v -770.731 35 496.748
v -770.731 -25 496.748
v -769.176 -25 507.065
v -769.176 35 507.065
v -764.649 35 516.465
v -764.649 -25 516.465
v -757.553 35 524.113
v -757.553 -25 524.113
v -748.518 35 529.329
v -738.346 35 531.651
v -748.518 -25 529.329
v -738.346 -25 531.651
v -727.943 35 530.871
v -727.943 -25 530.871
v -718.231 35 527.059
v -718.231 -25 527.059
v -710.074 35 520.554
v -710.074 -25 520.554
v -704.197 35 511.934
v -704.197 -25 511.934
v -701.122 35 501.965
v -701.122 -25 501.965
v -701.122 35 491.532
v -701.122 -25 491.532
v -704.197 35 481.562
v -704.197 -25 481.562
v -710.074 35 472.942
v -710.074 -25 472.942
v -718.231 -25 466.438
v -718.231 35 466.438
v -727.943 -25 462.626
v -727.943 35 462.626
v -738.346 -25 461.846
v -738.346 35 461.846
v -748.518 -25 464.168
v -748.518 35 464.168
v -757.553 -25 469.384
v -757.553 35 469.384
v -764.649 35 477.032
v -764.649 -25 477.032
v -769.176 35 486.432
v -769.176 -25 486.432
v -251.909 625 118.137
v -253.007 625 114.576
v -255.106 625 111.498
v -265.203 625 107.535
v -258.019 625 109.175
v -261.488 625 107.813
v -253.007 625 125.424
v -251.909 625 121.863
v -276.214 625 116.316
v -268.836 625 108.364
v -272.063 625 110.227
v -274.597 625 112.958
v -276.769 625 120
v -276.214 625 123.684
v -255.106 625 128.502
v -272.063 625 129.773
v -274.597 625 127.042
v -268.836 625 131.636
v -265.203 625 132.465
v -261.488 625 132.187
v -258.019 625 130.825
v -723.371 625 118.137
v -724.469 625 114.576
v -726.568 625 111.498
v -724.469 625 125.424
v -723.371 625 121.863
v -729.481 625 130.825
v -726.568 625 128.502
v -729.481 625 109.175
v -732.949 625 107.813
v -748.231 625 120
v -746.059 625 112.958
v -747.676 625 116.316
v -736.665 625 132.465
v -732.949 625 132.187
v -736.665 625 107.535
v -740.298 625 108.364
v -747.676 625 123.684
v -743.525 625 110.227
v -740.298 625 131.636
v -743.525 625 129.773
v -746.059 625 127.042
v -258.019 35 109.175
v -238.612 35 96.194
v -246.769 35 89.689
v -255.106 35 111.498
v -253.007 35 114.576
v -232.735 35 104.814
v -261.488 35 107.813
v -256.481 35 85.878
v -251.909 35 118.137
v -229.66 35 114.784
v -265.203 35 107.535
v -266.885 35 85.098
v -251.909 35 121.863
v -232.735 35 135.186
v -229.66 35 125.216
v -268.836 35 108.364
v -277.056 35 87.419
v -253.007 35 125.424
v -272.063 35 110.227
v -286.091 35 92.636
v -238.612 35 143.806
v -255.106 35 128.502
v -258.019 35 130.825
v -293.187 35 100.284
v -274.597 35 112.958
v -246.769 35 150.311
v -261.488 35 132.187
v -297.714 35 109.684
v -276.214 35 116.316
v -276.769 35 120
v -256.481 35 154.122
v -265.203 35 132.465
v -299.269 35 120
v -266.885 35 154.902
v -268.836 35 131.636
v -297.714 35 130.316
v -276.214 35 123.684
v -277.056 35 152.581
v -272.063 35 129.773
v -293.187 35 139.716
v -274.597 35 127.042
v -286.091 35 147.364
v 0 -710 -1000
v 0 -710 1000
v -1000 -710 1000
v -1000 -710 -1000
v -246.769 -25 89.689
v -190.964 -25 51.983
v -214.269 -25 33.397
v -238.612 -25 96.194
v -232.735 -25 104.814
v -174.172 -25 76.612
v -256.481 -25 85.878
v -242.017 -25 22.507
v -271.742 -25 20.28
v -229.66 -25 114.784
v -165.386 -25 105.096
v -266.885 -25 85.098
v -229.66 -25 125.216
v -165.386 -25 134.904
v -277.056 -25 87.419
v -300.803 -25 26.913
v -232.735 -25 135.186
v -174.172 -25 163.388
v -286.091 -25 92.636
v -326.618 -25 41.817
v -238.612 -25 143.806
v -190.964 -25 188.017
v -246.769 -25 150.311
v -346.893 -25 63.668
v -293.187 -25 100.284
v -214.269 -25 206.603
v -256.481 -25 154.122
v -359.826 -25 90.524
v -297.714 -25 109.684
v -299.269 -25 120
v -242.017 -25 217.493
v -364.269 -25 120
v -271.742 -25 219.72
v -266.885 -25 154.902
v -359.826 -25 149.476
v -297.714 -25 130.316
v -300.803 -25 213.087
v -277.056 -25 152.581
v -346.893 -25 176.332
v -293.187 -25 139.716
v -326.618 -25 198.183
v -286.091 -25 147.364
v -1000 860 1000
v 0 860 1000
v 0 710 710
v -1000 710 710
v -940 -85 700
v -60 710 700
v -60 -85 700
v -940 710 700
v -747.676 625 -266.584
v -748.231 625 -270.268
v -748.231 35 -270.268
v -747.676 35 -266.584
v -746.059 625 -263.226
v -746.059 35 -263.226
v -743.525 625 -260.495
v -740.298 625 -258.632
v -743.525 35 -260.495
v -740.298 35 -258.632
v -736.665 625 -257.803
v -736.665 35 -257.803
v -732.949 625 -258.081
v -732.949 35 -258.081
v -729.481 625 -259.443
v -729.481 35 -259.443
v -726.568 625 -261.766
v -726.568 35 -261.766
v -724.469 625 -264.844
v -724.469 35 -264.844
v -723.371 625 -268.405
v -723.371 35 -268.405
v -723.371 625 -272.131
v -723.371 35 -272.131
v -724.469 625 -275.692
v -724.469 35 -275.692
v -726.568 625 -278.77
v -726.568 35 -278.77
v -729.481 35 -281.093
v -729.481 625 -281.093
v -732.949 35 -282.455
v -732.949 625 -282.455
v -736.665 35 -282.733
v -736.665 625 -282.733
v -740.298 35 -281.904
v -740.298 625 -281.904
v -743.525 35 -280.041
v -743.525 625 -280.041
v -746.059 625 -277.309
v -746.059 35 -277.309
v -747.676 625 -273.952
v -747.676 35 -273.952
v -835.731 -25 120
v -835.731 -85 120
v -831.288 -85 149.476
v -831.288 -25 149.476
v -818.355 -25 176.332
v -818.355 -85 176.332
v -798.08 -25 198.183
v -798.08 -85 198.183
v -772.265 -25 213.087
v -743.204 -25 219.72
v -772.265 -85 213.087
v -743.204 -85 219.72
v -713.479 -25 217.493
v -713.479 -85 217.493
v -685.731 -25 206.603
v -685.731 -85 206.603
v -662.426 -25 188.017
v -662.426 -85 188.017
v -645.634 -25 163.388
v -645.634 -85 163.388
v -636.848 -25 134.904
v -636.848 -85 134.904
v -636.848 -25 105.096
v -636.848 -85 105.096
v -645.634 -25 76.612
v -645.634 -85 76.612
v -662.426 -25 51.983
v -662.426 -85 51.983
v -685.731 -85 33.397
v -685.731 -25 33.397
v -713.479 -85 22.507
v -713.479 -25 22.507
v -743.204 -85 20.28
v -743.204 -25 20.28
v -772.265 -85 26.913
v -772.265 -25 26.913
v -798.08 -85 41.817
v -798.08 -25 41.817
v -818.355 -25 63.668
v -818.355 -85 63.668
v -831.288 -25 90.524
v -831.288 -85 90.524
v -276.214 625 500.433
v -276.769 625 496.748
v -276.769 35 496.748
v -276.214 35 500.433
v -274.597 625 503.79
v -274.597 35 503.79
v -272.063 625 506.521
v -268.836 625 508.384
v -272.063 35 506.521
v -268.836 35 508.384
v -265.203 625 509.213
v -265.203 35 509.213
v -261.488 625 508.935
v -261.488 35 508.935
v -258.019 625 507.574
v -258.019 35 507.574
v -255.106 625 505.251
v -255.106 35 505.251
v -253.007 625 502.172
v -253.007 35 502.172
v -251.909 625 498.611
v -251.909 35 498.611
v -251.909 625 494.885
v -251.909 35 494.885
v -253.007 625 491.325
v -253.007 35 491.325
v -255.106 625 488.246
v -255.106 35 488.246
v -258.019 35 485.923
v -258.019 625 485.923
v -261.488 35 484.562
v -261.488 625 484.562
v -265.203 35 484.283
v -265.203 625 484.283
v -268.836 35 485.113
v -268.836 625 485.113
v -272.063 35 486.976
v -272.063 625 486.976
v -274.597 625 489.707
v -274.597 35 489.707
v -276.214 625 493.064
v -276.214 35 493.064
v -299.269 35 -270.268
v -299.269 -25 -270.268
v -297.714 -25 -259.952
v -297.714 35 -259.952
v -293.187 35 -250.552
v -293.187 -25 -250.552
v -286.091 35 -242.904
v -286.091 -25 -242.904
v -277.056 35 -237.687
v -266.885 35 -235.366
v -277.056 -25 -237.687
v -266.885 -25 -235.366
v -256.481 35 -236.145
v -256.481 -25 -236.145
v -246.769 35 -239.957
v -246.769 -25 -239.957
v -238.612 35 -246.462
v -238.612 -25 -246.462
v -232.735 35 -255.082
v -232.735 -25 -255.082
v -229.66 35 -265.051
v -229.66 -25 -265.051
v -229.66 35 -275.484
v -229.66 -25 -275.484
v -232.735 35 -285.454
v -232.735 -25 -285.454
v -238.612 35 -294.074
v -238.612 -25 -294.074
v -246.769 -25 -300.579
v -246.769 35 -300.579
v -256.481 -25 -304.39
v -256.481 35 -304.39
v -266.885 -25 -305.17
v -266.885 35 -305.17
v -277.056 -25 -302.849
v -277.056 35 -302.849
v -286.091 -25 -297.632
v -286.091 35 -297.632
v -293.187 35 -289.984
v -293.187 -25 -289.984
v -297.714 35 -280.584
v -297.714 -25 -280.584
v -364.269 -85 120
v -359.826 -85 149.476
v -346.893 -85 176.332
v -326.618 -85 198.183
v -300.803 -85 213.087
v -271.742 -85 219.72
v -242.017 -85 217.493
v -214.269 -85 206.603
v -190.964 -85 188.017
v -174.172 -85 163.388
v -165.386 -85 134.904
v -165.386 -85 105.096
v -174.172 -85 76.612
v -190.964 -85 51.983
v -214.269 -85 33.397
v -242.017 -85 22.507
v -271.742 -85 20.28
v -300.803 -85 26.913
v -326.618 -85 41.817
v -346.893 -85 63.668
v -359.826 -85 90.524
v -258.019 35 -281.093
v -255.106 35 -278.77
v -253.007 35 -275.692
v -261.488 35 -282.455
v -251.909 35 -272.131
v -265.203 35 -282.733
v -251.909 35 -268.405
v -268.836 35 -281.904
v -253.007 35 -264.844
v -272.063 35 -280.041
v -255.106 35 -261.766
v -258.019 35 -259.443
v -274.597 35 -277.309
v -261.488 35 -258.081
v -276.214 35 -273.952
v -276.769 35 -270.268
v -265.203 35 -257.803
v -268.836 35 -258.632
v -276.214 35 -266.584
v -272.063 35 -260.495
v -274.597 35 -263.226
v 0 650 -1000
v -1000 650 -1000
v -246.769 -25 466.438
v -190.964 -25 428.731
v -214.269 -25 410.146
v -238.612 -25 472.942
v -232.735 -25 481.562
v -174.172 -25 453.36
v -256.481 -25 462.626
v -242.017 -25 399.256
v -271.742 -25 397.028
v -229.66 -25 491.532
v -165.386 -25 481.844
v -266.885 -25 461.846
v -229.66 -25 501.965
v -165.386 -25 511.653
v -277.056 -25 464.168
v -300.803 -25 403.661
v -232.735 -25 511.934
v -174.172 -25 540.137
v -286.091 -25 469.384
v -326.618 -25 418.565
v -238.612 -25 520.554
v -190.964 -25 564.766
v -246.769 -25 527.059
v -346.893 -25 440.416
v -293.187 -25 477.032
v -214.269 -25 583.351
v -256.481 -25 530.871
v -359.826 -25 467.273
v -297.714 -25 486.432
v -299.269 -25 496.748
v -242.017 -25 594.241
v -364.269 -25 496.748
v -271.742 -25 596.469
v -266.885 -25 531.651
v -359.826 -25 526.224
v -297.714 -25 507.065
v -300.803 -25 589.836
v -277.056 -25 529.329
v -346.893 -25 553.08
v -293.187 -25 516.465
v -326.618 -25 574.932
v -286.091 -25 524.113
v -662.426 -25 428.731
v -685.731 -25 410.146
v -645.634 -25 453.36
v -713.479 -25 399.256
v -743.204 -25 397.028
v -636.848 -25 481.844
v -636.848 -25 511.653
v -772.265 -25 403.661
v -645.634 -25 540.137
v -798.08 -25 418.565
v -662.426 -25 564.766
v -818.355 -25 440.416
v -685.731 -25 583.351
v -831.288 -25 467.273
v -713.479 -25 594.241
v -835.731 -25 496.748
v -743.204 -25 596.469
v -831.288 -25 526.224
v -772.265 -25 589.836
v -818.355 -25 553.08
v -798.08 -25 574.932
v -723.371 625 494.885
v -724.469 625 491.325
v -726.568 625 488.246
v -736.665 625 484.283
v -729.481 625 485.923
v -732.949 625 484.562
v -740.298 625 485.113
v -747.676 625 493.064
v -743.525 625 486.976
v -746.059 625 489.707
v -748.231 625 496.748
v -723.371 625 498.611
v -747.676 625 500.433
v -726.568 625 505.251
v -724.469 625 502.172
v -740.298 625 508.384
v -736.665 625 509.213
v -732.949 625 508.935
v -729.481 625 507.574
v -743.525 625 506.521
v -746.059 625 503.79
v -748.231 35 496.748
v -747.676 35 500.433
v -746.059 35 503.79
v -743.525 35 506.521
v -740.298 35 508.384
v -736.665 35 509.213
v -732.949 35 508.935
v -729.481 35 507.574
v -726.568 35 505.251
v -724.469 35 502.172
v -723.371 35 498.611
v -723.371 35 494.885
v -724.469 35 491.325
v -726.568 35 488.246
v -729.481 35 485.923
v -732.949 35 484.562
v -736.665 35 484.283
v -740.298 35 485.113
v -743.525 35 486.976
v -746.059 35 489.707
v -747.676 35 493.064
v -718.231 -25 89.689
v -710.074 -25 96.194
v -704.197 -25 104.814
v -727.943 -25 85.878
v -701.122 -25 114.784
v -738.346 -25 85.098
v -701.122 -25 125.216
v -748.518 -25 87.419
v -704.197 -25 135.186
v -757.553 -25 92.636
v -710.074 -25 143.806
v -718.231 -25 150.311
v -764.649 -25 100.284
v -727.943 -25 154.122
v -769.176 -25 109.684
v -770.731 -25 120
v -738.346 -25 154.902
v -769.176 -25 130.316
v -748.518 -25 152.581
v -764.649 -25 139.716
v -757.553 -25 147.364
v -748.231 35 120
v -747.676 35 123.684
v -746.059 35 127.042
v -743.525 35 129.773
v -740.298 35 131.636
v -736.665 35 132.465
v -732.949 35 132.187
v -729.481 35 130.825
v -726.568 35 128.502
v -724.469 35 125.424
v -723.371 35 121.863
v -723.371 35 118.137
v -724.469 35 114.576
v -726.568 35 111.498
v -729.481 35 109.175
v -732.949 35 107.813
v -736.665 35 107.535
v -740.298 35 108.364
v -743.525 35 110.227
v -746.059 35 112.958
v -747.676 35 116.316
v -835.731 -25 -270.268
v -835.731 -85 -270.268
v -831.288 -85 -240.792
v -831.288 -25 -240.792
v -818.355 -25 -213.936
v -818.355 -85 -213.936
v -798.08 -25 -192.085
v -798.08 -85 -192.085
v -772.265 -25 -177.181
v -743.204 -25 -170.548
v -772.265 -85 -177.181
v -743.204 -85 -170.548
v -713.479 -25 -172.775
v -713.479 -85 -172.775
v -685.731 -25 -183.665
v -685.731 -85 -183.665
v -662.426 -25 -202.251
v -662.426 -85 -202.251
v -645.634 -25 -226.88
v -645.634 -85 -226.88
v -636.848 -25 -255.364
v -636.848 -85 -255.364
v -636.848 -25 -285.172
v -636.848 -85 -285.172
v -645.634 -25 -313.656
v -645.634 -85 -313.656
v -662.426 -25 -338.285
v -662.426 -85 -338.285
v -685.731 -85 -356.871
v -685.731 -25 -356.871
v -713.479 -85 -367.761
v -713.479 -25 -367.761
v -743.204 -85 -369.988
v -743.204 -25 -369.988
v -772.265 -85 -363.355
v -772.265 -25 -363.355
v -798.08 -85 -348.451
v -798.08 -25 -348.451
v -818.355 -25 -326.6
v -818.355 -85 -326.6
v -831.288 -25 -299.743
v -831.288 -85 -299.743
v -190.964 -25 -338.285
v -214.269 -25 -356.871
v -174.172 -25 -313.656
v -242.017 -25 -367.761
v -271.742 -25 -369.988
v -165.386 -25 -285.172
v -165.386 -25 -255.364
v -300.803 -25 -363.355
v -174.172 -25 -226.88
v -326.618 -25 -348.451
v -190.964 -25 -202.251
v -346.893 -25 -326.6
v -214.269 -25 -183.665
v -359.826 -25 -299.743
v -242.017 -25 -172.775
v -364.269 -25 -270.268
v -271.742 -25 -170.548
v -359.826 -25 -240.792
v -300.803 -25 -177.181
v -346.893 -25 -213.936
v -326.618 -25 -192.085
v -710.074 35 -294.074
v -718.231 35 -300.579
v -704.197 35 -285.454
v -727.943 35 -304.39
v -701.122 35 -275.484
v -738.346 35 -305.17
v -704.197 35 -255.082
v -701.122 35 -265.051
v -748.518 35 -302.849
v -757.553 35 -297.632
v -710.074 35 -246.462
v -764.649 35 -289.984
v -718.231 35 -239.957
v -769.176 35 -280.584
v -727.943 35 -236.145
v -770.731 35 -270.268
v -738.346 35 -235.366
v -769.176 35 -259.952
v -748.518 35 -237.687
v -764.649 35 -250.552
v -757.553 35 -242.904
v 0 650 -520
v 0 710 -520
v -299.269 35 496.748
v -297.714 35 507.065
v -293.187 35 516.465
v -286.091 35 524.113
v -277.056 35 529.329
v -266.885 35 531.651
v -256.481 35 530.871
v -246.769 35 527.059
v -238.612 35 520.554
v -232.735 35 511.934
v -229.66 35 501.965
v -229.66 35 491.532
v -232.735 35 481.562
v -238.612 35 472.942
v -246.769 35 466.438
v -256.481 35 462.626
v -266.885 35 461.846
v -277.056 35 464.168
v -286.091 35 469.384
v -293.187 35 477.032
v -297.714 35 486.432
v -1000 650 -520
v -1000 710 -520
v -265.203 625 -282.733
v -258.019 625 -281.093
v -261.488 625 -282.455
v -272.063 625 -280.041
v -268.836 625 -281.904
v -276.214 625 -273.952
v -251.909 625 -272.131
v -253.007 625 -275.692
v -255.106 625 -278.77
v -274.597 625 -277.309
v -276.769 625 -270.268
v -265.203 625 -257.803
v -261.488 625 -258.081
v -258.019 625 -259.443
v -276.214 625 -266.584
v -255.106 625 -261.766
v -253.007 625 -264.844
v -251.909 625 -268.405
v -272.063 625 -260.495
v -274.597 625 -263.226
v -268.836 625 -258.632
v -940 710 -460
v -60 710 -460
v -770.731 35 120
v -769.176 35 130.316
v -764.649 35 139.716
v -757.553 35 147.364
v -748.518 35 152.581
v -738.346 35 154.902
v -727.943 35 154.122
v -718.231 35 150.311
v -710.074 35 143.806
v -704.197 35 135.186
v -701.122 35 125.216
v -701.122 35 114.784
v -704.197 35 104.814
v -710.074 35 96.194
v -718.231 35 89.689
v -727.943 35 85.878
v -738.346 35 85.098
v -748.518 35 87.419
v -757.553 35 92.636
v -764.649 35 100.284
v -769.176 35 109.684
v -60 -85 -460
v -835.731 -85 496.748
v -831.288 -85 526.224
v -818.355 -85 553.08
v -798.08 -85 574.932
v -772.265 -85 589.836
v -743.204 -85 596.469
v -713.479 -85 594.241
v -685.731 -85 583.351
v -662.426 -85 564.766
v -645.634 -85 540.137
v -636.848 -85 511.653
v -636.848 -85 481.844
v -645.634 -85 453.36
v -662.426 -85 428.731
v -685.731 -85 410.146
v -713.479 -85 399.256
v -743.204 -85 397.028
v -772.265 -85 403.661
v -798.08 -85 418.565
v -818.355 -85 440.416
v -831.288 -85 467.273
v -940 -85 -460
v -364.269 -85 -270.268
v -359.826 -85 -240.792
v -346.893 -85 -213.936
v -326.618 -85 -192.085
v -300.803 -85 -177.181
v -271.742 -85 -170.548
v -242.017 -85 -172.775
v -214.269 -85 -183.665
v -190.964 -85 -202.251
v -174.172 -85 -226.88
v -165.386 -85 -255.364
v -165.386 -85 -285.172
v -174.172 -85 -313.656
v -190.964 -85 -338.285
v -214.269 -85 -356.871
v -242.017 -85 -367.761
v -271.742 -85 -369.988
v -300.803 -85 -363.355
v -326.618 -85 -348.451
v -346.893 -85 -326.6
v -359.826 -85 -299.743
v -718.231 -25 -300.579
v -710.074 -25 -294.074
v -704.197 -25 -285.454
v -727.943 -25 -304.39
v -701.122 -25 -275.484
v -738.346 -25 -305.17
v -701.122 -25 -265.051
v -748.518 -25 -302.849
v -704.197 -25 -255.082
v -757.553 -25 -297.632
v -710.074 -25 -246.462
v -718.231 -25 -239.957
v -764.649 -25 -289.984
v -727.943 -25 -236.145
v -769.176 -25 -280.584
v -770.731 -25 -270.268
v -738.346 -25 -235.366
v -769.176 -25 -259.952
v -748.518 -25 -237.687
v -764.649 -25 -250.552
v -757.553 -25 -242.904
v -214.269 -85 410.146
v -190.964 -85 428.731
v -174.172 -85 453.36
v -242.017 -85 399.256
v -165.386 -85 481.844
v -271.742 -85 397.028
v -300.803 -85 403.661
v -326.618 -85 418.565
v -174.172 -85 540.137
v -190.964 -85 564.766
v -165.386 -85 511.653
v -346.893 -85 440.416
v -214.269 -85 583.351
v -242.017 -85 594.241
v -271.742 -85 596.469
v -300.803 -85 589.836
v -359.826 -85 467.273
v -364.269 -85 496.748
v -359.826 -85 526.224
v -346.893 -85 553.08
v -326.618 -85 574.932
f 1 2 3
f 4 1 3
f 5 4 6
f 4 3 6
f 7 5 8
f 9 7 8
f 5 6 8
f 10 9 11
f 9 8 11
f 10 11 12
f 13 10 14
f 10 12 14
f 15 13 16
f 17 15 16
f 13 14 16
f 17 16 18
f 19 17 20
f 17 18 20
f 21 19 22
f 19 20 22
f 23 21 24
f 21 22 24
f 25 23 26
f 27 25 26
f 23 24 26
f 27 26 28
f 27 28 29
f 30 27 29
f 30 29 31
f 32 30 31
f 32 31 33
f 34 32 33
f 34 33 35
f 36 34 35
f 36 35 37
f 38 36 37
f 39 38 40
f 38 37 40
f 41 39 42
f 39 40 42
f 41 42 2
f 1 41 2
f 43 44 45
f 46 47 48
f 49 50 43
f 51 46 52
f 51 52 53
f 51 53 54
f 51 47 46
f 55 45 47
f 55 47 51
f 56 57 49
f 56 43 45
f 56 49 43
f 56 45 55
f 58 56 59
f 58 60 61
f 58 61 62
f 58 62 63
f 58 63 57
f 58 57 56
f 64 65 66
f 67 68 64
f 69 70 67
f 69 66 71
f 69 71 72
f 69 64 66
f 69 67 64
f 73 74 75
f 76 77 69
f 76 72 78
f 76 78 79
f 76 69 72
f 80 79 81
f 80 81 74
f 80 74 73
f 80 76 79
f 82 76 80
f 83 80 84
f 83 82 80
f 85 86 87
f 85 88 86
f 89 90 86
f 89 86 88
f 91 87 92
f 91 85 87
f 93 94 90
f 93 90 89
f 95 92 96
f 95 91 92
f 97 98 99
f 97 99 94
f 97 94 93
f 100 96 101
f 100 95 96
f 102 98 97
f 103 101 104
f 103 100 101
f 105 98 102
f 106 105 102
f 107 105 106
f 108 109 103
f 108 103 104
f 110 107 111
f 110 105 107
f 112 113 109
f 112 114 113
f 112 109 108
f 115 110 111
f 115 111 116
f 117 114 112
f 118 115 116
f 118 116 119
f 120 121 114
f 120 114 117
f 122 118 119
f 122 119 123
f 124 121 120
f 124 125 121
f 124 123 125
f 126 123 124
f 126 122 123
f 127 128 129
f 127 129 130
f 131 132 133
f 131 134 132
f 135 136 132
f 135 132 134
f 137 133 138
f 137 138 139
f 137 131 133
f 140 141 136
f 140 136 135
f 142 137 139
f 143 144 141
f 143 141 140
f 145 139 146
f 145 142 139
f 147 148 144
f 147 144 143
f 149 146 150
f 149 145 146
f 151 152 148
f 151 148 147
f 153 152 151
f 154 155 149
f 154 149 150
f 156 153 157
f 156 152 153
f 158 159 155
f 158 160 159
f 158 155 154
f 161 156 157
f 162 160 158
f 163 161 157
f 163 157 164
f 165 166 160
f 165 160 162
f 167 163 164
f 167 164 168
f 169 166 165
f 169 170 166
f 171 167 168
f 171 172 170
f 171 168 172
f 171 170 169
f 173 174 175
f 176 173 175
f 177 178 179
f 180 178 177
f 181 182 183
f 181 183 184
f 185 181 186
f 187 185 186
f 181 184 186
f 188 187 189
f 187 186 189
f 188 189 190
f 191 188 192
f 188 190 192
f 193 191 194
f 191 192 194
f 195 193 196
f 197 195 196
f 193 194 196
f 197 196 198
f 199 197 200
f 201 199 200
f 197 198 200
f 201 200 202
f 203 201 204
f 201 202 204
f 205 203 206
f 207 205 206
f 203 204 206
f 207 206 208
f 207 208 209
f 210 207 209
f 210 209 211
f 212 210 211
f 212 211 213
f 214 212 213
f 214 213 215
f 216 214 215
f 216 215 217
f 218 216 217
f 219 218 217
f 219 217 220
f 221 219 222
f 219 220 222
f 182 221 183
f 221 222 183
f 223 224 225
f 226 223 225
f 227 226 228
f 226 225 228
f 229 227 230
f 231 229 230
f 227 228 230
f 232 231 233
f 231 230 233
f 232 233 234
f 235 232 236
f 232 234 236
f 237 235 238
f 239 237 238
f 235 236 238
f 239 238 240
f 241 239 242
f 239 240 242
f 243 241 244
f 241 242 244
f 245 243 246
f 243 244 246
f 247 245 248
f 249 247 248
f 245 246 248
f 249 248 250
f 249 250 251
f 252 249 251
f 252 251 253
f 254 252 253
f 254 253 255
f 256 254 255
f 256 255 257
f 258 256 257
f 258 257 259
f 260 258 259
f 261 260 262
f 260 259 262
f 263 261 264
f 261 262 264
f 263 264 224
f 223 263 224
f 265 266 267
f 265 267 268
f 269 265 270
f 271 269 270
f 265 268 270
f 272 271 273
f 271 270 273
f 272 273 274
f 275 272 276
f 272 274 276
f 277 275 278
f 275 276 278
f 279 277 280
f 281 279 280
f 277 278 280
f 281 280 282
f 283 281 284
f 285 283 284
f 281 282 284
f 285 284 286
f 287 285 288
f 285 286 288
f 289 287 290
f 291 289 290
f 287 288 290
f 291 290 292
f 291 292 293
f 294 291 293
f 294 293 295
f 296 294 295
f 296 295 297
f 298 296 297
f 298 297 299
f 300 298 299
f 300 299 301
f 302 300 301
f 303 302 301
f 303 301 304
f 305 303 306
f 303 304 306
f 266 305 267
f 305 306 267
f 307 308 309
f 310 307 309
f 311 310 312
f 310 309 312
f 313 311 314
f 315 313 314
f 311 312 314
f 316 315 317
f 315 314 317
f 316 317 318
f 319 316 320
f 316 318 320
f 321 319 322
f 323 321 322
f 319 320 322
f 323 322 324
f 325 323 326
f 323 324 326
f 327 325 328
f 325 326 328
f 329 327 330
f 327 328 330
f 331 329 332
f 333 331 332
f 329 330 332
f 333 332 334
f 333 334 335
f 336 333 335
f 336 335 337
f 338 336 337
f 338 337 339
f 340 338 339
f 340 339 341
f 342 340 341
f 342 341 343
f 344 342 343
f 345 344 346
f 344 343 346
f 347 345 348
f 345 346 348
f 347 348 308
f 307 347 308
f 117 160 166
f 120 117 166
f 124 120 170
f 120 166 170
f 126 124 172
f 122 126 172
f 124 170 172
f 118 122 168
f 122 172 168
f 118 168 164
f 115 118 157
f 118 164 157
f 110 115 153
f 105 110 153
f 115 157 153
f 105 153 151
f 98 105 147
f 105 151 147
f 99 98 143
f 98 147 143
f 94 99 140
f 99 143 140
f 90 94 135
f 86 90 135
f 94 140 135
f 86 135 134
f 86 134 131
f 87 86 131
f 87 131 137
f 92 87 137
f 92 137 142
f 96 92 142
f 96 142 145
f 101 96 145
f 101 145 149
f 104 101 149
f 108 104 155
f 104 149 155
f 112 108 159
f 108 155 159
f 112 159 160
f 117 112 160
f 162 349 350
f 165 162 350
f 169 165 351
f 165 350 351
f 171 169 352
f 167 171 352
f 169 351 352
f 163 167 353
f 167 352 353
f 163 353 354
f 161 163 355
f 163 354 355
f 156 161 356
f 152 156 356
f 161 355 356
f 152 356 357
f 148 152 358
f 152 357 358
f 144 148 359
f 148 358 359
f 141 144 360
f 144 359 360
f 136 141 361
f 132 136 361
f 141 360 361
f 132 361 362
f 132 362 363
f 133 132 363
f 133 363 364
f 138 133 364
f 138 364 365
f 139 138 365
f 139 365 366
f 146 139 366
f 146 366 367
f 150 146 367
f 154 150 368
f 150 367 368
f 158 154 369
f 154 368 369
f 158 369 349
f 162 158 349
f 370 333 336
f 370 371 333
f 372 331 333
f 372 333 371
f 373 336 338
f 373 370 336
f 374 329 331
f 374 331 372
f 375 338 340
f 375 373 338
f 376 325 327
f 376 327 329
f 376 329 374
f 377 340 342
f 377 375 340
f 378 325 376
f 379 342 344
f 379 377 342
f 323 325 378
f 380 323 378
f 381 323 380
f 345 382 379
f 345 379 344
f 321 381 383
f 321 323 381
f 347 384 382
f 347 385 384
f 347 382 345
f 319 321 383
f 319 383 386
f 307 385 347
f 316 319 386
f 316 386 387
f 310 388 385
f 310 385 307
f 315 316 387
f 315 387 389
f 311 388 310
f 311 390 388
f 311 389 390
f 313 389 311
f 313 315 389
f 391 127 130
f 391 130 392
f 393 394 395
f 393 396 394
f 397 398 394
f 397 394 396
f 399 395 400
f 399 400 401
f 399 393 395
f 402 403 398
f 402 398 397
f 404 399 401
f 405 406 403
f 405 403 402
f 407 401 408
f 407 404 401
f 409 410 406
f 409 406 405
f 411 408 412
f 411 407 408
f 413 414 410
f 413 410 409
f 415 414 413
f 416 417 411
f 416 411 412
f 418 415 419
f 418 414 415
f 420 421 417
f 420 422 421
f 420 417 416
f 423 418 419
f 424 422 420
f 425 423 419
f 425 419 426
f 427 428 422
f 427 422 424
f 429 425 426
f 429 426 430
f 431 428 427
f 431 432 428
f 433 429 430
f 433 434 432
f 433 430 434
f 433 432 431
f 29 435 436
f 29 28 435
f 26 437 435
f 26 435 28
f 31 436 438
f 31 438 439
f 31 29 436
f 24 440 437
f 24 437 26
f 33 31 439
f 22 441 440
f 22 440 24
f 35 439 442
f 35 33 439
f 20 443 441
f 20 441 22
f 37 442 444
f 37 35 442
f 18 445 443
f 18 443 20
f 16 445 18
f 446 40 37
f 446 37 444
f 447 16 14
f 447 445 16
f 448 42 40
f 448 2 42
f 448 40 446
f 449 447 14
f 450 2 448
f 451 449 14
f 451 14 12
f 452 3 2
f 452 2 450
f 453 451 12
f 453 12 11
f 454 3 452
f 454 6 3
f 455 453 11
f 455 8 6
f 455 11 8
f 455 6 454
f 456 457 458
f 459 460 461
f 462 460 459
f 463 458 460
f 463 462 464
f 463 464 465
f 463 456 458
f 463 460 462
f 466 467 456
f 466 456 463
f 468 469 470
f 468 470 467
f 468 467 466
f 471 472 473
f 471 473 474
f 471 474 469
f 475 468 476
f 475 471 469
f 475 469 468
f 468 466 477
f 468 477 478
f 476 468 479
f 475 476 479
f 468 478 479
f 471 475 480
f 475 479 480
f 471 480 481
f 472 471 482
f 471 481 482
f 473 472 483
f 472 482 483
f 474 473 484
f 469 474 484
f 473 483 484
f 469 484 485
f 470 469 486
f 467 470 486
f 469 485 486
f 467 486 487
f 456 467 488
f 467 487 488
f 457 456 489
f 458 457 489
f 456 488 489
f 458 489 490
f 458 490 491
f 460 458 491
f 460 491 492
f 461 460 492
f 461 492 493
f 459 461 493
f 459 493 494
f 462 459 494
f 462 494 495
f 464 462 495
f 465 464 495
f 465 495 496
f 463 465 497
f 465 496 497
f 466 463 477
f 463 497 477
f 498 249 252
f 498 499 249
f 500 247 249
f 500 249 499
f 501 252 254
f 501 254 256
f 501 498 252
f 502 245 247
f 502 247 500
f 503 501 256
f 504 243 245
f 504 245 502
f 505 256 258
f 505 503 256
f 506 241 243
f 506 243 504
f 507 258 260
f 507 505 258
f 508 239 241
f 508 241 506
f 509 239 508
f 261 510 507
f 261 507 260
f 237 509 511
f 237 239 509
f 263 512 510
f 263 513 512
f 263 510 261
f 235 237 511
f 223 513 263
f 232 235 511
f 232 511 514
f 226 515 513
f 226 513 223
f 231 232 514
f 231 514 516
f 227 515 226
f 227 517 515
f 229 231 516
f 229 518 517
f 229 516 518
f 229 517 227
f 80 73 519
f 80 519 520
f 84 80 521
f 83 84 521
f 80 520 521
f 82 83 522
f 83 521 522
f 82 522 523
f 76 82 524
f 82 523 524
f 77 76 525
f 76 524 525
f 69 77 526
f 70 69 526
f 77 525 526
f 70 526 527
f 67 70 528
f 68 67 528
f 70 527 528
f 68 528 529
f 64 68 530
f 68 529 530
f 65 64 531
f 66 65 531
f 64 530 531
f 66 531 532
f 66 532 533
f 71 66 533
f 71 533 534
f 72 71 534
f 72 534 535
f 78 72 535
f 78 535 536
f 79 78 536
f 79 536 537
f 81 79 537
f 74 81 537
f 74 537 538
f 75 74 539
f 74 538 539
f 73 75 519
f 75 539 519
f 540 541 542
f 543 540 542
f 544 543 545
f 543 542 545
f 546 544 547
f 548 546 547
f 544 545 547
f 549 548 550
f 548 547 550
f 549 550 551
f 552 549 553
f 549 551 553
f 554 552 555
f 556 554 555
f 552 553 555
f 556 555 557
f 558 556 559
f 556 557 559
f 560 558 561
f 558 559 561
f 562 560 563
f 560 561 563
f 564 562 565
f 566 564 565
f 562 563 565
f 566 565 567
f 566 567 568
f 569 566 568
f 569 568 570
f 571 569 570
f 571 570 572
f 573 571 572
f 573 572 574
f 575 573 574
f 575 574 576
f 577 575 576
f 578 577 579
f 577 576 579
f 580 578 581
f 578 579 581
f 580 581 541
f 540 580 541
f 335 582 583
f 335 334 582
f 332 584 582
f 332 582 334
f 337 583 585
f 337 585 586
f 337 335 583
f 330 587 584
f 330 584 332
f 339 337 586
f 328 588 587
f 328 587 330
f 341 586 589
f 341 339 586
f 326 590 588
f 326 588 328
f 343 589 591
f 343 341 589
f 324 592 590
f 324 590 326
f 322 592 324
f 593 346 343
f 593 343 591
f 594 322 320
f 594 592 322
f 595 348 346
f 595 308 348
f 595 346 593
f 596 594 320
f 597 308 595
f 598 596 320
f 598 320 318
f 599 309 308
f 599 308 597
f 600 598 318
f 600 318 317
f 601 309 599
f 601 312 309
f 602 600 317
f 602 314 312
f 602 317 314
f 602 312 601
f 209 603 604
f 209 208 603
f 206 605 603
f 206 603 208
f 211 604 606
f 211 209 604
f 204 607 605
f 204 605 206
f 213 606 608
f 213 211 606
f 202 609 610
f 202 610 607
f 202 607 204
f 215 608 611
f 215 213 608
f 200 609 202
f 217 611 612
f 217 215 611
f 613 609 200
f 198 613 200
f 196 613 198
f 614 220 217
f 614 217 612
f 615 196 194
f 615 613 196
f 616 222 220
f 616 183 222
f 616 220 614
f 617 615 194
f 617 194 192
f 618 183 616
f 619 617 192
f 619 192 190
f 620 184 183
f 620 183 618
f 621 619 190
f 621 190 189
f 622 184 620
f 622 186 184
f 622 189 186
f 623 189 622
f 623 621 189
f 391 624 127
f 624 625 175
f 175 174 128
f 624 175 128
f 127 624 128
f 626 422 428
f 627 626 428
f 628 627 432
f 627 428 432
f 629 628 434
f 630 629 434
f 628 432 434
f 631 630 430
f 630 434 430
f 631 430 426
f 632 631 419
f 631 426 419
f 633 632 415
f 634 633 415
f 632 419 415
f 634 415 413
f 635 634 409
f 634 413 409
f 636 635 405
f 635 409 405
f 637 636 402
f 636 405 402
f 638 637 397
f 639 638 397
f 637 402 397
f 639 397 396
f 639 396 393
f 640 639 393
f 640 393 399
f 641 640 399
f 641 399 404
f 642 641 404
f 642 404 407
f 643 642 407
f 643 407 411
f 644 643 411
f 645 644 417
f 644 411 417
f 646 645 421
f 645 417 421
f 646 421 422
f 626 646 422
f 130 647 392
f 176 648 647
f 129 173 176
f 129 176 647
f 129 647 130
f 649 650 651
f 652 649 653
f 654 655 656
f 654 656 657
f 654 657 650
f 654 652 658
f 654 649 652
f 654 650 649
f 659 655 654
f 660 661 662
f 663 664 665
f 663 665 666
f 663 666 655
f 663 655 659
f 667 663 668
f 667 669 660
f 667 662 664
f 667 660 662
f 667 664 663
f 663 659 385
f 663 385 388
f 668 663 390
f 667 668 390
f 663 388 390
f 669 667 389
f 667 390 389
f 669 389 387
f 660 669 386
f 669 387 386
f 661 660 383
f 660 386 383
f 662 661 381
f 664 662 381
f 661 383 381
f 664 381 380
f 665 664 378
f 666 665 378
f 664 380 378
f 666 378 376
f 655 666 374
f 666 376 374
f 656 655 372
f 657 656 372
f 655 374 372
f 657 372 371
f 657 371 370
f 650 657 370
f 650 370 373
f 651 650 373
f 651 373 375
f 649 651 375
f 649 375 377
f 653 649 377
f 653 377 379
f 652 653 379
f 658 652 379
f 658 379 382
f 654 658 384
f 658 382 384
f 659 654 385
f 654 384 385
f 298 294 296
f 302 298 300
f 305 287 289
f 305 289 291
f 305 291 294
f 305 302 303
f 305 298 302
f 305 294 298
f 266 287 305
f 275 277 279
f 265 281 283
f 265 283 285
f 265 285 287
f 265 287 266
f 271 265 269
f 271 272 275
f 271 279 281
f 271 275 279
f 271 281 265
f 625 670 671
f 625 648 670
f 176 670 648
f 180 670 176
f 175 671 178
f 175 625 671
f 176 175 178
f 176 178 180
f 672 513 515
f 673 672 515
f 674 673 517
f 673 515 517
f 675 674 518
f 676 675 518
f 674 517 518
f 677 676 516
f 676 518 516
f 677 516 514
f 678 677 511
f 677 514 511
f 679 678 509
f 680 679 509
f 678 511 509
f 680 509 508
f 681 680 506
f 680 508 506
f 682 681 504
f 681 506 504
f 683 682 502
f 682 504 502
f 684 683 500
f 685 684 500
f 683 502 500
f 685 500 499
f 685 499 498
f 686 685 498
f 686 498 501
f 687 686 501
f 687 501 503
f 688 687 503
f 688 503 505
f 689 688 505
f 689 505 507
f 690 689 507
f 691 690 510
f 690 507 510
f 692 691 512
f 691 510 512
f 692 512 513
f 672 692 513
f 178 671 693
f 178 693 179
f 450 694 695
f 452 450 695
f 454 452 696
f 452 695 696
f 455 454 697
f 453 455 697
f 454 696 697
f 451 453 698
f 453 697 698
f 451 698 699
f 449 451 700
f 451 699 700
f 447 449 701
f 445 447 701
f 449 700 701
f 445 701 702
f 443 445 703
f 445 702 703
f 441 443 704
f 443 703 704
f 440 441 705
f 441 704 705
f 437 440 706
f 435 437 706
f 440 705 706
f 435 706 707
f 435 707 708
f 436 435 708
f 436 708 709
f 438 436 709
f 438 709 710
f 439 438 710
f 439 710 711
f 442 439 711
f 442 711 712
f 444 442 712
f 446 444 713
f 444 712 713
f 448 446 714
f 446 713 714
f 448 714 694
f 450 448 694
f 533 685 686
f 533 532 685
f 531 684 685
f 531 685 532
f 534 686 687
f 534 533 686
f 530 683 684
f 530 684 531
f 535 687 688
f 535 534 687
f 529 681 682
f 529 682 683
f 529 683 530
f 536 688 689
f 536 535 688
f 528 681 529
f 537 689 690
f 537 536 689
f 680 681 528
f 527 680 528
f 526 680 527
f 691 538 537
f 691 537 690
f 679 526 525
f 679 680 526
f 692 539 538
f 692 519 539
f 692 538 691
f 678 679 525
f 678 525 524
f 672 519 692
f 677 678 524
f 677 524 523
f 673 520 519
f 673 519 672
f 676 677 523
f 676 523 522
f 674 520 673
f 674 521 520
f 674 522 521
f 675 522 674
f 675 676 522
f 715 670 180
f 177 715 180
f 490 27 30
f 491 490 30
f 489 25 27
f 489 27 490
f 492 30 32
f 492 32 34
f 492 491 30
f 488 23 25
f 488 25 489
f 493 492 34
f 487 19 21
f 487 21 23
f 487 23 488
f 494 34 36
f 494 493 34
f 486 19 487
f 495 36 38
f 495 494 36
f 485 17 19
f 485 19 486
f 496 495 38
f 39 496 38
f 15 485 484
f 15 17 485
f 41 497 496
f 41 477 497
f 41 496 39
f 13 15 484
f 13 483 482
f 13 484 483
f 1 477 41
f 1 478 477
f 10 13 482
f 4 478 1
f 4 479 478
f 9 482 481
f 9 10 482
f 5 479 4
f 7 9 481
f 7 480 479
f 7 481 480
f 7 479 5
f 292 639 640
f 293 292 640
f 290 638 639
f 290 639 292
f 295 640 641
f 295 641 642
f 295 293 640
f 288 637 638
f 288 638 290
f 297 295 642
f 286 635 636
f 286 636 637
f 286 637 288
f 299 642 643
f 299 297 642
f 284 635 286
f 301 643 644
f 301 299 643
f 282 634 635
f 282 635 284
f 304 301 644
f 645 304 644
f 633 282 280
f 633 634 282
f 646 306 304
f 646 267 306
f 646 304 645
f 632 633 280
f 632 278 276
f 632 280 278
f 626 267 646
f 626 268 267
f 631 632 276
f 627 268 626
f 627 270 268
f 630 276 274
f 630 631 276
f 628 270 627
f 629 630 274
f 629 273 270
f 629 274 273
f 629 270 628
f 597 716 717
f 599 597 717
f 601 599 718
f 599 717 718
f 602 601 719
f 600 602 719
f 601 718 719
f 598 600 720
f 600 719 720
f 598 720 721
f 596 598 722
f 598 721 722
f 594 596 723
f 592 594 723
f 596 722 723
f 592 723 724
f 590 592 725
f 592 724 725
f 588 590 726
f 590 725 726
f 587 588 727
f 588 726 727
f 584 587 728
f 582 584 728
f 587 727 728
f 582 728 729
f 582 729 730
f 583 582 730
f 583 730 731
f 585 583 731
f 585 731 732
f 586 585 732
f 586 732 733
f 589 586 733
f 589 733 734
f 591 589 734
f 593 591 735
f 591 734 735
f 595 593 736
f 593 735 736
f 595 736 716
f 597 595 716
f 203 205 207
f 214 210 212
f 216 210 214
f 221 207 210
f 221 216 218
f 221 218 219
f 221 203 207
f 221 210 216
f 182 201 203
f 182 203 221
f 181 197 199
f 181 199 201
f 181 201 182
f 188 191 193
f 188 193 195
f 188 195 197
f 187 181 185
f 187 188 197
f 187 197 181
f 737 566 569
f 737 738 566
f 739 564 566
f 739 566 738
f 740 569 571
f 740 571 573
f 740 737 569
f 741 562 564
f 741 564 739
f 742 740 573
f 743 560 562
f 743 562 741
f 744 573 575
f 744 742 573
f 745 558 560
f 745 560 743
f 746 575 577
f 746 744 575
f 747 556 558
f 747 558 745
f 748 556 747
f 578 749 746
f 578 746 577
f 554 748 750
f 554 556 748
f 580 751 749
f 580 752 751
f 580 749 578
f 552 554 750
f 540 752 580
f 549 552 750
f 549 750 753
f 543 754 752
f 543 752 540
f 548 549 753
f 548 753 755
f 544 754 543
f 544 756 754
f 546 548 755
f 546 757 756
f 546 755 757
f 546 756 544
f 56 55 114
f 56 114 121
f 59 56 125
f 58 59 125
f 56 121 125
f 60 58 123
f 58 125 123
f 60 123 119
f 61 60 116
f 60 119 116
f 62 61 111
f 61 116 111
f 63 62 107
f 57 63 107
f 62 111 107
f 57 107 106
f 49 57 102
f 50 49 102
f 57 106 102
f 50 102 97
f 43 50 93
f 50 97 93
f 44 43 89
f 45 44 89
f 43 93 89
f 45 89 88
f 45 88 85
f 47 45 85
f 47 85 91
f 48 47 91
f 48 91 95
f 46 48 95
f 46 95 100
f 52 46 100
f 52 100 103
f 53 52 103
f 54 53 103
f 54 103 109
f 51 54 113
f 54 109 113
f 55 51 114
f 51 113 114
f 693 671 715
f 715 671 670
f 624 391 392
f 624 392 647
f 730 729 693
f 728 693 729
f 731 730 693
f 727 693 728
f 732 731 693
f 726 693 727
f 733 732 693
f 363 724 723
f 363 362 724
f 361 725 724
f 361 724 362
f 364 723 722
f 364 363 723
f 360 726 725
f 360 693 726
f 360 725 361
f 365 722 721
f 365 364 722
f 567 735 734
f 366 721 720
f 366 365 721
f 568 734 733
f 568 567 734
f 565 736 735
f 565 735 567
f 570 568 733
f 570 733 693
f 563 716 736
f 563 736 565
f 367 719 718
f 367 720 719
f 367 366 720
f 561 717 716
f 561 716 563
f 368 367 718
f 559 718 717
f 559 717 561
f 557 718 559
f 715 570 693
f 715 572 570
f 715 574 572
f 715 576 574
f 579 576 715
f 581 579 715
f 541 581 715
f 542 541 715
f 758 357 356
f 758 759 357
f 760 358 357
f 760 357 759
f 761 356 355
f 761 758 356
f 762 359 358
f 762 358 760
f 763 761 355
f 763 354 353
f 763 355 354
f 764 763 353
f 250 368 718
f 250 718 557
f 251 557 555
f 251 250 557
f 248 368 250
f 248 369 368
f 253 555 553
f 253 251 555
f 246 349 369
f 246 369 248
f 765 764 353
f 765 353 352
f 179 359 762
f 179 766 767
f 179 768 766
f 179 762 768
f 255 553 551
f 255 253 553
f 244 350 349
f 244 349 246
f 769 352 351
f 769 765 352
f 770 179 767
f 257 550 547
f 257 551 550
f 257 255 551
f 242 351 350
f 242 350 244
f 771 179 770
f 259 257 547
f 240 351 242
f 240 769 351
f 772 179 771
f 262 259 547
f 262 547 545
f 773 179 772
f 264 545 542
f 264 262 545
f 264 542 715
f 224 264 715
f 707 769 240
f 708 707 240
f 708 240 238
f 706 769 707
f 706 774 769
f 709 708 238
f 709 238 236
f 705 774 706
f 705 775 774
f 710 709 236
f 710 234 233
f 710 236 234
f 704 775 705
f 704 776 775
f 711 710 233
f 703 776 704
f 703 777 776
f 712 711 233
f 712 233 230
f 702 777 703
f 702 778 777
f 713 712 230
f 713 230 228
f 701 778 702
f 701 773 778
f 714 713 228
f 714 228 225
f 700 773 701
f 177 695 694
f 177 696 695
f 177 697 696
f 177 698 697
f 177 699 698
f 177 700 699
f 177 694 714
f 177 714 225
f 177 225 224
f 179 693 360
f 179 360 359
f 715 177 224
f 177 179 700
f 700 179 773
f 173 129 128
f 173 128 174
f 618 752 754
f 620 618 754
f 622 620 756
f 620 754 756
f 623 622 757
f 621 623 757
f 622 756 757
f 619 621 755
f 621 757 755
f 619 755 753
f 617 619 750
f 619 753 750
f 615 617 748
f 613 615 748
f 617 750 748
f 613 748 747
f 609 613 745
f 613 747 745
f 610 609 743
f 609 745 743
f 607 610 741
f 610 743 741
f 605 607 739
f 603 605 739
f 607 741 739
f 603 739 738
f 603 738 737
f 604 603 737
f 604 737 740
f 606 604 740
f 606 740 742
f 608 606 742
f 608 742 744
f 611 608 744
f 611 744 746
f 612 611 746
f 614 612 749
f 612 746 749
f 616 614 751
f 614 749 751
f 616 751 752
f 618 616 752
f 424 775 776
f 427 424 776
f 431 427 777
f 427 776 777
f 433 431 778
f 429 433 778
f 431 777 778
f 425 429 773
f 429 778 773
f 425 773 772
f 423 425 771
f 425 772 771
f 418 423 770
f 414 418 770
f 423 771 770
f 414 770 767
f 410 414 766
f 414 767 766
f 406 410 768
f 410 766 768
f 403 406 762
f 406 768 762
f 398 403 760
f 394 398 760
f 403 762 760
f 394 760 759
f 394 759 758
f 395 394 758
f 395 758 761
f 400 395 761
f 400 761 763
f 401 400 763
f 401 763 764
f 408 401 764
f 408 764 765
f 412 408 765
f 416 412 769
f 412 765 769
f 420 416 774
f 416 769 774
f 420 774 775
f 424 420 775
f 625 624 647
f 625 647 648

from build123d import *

# Parameters (mm, degrees)
F1_DEPTH  = 1000
F2_W      = 880
F2_H      = 1160
F3_DEPTH  = 795
F5_DEPTH  = 1000
F6_R      = 100
F7_DEPTH  = 60
F8_R      = 35
F9_DEPTH  = 60
F10_R     = 12.5
F11_DEPTH = 590


with BuildPart() as f1:
    # F0 (on Right) → F1 (new body)
    with BuildSketch(Plane.YZ):
        Polygon((710, 1000), (-710, 1000), (-710, -1000), (650, -1000), (650, -520), (710, -520), align=None)
    extrude(amount=-F1_DEPTH)

    # F2 (on face) → F3 (cut)
    with BuildSketch(Plane(origin=(0, 710, 0), x_dir=(-1, 0, 0), z_dir=(0, 1, 0))):
        with Locations((500, 120)):
            Rectangle(F2_W, F2_H)
    extrude(amount=-F3_DEPTH, mode=Mode.SUBTRACT)

    # F4 (on face) → F5 (join, through all)
    with BuildSketch(Plane(origin=(-1000, 0, 0), x_dir=(0, -1, 0), z_dir=(-1, 0, 0))):
        Polygon((-710, 710), (-710, 1000), (-860, 1000), align=None)
    extrude(amount=-F5_DEPTH)

    # F6 (on face) → F7 (join)
    with BuildSketch(Plane(origin=(0, -85, 0), x_dir=(-1, 0, 0), z_dir=(0, 1, 0))):
        with Locations((735.730886, 496.748427)):
            Circle(F6_R)
        with Locations((735.730886, 120)):
            Circle(F6_R)
        with Locations((735.730886, -270.26796)):
            Circle(F6_R)
        with Locations((264.269114, 496.748427)):
            Circle(F6_R)
        with Locations((264.269114, 120)):
            Circle(F6_R)
        with Locations((264.269114, -270.26796)):
            Circle(F6_R)
    extrude(amount=F7_DEPTH)

    # F8 (on face) → F9 (join)
    with BuildSketch(Plane(origin=(0, -25, 0), x_dir=(-1, 0, 0), z_dir=(0, 1, 0))):
        with Locations((735.730886, 496.748427)):
            Circle(F8_R)
        with Locations((735.730886, 120)):
            Circle(F8_R)
        with Locations((735.730886, -270.26796)):
            Circle(F8_R)
        with Locations((264.269114, -270.26796)):
            Circle(F8_R)
        with Locations((264.269114, 120)):
            Circle(F8_R)
        with Locations((264.269114, 496.748427)):
            Circle(F8_R)
    extrude(amount=F9_DEPTH)

    # F10 (on face) → F11 (join)
    with BuildSketch(Plane(origin=(0, 35, 0), x_dir=(-1, 0, 0), z_dir=(0, 1, 0))):
        with Locations((735.730886, 496.748427)):
            Circle(F10_R)
        with Locations((735.730886, 120)):
            Circle(F10_R)
        with Locations((735.730886, -270.26796)):
            Circle(F10_R)
        with Locations((264.269114, -270.26796)):
            Circle(F10_R)
        with Locations((264.269114, 120)):
            Circle(F10_R)
        with Locations((264.269114, 496.748427)):
            Circle(F10_R)
    extrude(amount=F11_DEPTH)


solid = f1.part
